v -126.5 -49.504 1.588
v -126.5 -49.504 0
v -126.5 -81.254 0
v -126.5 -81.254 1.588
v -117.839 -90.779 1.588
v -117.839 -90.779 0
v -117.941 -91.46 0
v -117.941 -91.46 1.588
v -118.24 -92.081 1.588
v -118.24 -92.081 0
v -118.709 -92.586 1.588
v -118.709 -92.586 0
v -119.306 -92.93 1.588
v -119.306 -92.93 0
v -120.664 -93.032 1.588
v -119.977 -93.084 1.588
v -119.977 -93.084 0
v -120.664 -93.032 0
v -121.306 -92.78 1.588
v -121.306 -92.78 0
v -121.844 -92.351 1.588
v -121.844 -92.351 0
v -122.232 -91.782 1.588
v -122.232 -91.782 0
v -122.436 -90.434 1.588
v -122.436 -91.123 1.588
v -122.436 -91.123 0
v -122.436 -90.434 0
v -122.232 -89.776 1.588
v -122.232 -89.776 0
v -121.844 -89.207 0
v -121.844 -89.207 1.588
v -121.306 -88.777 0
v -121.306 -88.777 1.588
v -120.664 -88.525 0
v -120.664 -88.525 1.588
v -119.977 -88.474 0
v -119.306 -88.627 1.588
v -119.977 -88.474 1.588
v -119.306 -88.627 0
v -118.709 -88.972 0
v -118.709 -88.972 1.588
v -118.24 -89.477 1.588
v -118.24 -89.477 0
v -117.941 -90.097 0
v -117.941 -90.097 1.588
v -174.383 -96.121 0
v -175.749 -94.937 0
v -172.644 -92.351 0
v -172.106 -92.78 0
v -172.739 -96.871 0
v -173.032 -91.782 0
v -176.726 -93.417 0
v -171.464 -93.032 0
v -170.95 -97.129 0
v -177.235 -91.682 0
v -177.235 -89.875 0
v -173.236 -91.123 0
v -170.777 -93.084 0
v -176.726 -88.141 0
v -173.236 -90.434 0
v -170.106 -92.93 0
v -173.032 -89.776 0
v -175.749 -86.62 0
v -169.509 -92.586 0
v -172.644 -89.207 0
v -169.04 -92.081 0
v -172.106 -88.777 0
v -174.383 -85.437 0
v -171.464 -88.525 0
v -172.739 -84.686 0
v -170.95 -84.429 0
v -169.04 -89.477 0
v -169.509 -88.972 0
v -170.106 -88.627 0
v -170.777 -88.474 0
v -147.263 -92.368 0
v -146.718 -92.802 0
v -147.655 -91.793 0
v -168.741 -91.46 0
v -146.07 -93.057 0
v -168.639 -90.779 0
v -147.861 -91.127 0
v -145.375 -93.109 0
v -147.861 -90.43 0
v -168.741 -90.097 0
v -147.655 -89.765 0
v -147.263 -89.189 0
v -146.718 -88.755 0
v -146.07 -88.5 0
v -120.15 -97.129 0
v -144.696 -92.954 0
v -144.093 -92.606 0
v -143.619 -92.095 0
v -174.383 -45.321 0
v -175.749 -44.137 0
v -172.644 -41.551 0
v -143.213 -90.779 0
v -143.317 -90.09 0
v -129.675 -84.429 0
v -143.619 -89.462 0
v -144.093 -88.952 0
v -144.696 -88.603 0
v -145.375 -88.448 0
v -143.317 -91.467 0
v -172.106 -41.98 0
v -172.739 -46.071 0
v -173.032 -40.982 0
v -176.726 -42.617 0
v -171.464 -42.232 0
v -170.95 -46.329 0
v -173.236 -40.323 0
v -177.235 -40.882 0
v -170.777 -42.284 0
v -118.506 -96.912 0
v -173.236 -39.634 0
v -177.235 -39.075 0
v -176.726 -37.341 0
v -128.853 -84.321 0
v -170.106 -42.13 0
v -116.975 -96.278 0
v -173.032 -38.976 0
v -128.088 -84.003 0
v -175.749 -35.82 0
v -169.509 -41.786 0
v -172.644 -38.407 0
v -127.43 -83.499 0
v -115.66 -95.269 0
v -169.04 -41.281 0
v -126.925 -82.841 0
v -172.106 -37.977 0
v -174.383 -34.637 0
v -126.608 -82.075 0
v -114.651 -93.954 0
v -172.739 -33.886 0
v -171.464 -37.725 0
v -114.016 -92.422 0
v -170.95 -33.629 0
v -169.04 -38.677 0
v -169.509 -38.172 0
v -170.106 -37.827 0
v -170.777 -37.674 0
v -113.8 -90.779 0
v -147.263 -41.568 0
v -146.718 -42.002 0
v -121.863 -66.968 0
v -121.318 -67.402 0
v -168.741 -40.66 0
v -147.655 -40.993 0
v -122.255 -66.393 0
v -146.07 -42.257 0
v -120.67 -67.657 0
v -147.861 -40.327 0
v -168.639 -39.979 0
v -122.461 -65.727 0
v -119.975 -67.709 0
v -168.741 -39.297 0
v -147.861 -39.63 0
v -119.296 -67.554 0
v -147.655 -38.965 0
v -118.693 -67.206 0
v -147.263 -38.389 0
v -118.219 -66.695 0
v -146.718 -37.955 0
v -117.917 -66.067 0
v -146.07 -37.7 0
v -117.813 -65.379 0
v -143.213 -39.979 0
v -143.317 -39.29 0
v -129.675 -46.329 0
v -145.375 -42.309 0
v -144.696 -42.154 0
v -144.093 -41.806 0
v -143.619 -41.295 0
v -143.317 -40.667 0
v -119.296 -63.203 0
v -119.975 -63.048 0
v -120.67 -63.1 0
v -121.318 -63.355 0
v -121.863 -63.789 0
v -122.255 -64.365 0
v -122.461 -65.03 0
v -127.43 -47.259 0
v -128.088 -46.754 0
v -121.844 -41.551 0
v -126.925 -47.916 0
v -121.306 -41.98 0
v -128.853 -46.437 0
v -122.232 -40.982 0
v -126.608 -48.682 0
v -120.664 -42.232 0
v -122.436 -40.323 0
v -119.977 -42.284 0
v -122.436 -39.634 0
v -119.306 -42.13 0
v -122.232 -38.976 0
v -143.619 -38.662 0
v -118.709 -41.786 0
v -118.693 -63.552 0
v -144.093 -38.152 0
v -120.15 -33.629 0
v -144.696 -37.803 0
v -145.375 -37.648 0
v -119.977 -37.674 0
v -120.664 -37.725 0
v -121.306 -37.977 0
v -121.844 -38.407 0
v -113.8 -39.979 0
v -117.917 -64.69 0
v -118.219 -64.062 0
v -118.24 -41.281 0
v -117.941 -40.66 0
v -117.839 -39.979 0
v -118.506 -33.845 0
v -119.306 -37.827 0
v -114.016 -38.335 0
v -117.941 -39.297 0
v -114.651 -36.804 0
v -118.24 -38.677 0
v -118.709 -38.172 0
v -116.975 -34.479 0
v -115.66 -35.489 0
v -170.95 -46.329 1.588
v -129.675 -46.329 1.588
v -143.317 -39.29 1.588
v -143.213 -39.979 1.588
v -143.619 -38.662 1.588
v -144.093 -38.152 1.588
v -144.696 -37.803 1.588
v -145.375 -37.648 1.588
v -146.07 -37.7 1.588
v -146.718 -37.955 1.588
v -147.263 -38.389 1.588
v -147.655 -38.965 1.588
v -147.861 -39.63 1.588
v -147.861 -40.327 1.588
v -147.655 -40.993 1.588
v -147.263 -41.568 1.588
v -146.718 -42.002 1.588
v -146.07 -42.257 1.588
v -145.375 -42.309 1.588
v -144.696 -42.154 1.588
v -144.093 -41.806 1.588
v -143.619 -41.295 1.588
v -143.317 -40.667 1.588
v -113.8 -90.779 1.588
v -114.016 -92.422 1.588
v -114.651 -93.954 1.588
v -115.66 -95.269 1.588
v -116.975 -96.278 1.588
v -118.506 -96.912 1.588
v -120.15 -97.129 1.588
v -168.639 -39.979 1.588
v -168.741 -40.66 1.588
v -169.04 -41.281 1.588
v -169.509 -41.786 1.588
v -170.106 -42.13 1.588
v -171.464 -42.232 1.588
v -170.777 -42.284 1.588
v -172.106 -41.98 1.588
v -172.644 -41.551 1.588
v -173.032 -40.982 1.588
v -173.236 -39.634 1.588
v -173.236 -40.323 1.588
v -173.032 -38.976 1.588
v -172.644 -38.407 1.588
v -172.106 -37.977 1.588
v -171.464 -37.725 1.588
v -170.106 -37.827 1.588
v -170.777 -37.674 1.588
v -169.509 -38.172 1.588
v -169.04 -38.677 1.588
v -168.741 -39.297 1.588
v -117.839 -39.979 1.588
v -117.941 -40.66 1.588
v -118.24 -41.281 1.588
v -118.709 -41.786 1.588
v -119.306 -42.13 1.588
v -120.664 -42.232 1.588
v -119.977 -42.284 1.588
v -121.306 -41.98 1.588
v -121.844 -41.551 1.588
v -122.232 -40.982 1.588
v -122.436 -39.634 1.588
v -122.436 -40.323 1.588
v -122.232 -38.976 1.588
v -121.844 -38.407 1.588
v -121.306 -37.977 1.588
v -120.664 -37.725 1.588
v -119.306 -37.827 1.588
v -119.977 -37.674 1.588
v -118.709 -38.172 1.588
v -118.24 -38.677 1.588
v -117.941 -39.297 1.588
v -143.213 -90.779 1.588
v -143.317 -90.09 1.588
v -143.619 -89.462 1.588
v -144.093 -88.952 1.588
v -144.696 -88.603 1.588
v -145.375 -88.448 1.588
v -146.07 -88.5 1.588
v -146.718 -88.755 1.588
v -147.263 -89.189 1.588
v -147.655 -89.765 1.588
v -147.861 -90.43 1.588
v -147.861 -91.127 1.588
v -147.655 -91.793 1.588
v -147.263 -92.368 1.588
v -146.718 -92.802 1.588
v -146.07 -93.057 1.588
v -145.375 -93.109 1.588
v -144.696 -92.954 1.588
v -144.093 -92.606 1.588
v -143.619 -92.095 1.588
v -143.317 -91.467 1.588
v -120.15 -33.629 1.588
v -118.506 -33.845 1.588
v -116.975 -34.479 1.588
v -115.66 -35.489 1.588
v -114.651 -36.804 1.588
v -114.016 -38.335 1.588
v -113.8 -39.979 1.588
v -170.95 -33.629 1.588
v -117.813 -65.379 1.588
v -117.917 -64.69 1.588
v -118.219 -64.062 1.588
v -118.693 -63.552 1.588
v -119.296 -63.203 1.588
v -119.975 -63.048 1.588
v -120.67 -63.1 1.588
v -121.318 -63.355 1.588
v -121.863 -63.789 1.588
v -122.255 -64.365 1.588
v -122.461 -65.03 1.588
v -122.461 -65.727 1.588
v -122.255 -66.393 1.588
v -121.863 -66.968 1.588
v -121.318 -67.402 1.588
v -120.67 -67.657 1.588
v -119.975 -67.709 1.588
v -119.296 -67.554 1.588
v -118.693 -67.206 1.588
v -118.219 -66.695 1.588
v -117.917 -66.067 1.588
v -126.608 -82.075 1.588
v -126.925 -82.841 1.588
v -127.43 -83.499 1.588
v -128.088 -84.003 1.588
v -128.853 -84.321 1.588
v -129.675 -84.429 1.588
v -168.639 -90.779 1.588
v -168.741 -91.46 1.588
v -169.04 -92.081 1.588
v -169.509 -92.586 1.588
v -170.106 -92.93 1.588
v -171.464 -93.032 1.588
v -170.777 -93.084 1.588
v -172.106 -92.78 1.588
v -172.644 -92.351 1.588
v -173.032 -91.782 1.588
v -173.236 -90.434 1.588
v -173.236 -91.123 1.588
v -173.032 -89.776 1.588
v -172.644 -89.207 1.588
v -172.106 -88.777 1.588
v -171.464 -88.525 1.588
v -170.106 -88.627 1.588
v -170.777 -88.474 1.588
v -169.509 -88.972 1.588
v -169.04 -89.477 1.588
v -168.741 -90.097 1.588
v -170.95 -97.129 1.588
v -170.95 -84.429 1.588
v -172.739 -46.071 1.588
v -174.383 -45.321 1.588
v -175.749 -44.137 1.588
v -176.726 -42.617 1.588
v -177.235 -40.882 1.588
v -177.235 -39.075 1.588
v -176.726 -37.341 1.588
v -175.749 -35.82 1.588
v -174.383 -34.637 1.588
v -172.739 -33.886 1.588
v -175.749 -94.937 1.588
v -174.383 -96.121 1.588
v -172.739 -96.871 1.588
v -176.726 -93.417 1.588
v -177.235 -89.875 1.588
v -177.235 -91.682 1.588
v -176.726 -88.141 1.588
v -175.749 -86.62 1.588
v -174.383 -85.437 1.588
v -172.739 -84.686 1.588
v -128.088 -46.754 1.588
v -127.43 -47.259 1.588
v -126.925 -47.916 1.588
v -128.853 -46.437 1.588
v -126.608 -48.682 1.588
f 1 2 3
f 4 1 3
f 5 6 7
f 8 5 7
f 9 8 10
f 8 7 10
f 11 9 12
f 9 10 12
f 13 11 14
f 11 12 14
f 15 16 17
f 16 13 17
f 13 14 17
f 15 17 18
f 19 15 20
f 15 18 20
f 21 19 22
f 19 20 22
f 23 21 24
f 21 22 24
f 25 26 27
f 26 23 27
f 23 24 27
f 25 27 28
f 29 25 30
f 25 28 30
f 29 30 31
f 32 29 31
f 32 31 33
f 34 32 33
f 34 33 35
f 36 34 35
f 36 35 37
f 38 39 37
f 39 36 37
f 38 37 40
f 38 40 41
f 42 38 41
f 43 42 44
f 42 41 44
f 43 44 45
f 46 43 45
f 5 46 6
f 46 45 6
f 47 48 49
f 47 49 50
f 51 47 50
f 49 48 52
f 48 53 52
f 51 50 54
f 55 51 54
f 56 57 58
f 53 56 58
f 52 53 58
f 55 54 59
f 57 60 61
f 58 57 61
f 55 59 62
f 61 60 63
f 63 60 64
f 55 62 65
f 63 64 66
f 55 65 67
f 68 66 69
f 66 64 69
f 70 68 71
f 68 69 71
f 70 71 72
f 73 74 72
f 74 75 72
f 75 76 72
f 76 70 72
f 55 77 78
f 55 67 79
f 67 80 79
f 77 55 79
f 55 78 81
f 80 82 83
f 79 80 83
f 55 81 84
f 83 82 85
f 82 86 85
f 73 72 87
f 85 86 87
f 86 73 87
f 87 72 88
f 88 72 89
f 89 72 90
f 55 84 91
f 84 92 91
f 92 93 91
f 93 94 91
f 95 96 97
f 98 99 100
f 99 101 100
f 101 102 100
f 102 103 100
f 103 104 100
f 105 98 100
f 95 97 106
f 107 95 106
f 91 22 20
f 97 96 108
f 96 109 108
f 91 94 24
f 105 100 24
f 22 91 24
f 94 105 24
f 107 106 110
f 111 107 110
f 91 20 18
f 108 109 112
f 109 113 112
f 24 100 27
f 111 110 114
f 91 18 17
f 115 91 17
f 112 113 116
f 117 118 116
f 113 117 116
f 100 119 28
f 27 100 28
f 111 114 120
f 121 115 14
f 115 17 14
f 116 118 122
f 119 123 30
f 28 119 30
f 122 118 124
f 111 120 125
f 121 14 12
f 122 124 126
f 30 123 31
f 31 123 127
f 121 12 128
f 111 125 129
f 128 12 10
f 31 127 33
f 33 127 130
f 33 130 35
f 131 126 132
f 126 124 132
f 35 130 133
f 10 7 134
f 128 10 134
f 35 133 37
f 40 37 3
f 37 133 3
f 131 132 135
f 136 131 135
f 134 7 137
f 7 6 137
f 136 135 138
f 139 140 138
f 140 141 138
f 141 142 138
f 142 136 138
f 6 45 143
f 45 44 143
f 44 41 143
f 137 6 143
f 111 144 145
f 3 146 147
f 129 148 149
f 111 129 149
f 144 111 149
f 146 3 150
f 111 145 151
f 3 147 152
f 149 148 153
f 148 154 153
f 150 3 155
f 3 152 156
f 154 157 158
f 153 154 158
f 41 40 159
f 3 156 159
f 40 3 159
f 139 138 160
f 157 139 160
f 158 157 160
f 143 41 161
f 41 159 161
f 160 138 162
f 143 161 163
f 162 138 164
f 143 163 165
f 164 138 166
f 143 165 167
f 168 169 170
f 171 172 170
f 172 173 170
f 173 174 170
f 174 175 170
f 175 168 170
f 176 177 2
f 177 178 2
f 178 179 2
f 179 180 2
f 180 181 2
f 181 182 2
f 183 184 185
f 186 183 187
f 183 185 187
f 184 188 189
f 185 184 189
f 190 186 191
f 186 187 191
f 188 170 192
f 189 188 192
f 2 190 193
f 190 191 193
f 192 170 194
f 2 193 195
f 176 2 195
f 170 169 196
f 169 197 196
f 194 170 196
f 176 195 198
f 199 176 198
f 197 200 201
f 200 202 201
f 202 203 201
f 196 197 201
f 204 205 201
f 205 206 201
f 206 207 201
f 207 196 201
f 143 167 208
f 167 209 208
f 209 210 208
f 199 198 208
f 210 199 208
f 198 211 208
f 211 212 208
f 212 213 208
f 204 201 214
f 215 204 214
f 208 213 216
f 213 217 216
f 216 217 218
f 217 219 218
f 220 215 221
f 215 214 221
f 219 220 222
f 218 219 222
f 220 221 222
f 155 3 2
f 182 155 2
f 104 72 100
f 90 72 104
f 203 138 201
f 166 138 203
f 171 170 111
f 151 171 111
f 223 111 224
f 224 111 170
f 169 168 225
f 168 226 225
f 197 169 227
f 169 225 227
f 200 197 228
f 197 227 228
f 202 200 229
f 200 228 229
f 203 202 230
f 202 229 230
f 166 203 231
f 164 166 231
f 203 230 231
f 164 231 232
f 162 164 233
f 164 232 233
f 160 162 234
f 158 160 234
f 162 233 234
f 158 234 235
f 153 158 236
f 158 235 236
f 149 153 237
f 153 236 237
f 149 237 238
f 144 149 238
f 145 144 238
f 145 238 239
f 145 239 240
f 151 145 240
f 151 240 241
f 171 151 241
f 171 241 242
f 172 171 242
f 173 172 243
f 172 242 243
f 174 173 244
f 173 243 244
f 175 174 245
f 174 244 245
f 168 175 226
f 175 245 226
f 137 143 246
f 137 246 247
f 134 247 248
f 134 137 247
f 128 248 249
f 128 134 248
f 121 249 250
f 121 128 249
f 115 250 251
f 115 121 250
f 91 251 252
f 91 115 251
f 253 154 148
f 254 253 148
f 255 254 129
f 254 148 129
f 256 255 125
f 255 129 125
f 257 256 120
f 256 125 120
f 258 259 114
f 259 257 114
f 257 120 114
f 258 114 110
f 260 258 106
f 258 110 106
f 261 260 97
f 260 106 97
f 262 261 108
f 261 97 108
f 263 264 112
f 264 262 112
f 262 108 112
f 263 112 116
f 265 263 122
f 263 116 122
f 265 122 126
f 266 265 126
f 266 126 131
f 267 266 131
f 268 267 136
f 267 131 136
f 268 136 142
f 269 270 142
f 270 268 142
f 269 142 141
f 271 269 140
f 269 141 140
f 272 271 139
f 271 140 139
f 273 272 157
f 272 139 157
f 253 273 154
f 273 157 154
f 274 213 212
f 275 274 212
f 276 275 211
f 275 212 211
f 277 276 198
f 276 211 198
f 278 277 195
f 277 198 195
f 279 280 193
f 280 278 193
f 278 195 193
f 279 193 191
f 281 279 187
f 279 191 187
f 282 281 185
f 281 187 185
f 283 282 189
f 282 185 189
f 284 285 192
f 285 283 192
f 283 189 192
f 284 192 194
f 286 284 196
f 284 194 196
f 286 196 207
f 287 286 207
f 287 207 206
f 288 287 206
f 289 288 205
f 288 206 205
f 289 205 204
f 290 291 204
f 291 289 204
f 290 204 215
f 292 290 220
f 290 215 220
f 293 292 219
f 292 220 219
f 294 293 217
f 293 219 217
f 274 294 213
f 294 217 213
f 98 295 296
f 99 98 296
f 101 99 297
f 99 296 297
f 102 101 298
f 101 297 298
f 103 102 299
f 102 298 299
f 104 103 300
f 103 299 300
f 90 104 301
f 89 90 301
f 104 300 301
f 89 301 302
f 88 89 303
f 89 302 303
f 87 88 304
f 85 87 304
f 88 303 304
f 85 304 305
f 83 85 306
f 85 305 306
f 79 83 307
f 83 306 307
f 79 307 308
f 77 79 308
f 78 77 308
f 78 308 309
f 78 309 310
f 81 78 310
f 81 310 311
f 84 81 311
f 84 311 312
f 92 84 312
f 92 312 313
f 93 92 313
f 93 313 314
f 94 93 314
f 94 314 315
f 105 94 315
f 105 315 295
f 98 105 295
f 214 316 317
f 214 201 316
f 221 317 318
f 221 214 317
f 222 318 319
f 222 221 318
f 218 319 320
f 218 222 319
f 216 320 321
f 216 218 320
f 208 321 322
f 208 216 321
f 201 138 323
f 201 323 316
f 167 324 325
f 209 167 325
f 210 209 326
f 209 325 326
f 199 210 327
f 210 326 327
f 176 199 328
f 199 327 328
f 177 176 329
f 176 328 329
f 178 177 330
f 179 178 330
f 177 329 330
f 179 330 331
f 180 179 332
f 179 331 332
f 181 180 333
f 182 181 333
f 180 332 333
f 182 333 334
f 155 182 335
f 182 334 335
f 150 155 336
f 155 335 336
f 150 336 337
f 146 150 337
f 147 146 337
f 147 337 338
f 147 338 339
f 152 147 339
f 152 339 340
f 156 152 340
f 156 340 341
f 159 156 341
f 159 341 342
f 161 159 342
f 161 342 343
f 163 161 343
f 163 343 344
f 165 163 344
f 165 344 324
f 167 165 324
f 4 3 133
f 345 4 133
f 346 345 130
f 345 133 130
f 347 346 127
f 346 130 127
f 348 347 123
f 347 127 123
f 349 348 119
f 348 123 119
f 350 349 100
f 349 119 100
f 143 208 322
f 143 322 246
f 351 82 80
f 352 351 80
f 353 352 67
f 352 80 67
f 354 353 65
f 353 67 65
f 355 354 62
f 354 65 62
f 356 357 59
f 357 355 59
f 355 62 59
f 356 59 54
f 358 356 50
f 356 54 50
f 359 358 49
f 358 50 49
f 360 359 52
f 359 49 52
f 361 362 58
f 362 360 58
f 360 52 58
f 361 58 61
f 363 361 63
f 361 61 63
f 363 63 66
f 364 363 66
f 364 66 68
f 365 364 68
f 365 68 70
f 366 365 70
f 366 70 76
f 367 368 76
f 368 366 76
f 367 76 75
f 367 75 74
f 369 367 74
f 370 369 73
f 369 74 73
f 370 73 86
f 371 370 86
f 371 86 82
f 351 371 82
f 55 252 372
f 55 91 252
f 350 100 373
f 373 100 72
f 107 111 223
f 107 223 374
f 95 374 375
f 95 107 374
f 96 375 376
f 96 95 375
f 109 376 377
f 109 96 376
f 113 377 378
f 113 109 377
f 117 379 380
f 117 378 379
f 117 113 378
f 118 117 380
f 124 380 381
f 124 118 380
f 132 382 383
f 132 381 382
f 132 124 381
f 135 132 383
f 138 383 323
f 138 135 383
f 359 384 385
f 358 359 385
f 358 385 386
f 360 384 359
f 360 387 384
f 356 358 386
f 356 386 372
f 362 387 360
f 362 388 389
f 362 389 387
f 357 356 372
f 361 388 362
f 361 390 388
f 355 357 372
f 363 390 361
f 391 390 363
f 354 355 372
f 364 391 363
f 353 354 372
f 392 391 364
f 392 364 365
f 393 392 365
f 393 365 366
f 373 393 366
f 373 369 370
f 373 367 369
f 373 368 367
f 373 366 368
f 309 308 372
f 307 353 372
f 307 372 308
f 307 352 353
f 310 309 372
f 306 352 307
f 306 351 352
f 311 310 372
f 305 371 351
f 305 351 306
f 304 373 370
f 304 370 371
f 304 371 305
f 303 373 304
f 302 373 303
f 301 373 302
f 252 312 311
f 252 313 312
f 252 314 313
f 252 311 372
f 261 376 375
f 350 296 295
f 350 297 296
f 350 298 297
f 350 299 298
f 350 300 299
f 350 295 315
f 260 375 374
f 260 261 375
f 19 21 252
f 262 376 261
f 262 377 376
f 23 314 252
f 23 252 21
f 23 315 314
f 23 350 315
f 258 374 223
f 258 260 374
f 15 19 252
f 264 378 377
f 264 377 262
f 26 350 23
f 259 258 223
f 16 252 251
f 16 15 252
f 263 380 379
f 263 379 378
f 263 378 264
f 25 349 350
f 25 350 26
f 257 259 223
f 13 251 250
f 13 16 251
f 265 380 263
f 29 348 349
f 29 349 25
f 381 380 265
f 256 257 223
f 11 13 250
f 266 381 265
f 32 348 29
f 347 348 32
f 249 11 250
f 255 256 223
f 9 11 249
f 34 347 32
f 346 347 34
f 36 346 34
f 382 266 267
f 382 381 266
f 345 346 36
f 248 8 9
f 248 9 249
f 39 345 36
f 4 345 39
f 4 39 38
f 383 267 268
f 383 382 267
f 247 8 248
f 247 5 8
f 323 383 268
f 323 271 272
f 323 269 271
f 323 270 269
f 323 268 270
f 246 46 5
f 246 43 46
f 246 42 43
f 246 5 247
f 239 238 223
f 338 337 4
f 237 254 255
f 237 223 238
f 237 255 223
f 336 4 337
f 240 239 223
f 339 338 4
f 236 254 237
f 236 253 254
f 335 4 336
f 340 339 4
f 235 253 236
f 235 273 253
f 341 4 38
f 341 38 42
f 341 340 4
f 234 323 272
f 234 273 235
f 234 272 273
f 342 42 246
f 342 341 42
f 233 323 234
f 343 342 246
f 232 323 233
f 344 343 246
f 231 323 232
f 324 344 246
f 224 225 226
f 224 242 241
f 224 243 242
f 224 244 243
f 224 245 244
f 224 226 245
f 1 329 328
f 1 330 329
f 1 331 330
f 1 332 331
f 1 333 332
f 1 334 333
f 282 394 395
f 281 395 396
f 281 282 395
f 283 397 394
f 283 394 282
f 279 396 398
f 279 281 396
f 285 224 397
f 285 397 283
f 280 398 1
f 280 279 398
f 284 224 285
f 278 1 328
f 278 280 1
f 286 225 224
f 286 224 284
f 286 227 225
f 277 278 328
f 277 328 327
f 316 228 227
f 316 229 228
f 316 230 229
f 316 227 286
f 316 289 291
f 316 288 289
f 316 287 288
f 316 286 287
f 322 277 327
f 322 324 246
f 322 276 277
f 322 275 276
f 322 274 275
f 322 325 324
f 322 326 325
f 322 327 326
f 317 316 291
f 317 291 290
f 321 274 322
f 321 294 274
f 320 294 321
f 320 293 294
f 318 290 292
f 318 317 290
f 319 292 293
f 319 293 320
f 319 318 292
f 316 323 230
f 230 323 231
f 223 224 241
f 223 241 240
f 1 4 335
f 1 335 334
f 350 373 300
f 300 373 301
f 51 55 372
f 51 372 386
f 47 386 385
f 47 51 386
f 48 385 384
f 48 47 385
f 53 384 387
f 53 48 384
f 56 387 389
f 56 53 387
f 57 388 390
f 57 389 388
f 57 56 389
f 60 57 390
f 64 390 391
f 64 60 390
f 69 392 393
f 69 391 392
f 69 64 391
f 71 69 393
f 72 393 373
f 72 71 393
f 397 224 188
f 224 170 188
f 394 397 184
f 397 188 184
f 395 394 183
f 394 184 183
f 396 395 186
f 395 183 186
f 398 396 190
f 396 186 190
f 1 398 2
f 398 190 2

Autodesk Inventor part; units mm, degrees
ref_plane "YZ Plane" through (0, 0, 0) normal (1, 0, 0) x (0, 1, 0)
ref_plane "XZ Plane" through (0, 0, 0) normal (0, 1, 0) x (-1, 0, 0)
ref_plane "XY Plane" through (0, 0, 0) normal (0, 0, 1) x (1, 0, 0)
sketch "Sketch1" plane through (0, 0, 0) normal (0, 0, 1) x (1, 0, 0)
  line L0 (-127.5242, -32.3587) -> (-188.9758, -32.3587) projected
  line L1 (-128.9881, -97.1287) -> (-187.5119, -97.1287) projected
  line L2 (-113.8, -97.1287) -> (-113.8, -85.5717) projected
  circle A0 centre (-120.15, -39.9787) radius 2.3114 projected
  circle A1 centre (-120.15, -90.7787) radius 2.3114 projected
  circle A2 centre (-170.95, -90.7787) radius 2.3114 projected
  circle A3 centre (-170.95, -39.9787) radius 2.3114 projected
  circle A4 centre (-158.25, -39.9787) radius 2.3114 projected
  circle A5 centre (-158.25, -90.7787) radius 2.3114 projected
  circle A6 centre (-120.15, -39.9787) radius 6.35
  circle A7 centre (-170.95, -39.9787) radius 6.35
  circle A8 centre (-170.95, -90.7787) radius 6.35
  circle A9 centre (-120.15, -90.7787) radius 6.35
  line L3 (-170.95, -33.6287) -> (-120.15, -33.6287)
  line L4 (-113.8, -39.9787) -> (-113.8, -90.7787)
  line L5 (-120.15, -97.1287) -> (-170.95, -97.1287)
  line L6 (-170.95, -46.3287) -> (-129.675, -46.3287)
  line L7 (-126.5, -49.5037) -> (-126.5, -81.2537)
  line L8 (-129.675, -84.4287) -> (-170.95, -84.4287)
  arc A10 (-126.5, -49.5037) -> (-129.675, -46.3287) centre (-129.675, -49.5037) ccw
  arc A11 (-129.675, -84.4287) -> (-126.5, -81.2537) centre (-129.675, -81.2537) ccw
  circle A12 centre (-170.95, -39.9787) radius 2.3114
  circle A13 centre (-120.15, -39.9787) radius 2.3114
  circle A14 centre (-120.15, -90.7787) radius 2.3114
  circle A15 centre (-170.95, -90.7787) radius 2.3114
  circle A16 centre (-158.25, -90.7787) radius 2.3114
  circle A17 centre (-158.25, -39.9787) radius 2.3114
  point P0 (0, 0)
  dimension "d6" = 12.7
  dimension "d7" = 12.7
  dimension "d8" = 12.7
  dimension "d9" = 12.7
  dimension "d10" = 3.175
extrude "Extrusion1" add sketch "Sketch1" along normal blind 1.5875
sketch "Sketch2" plane through (0, 0, 1.5875) normal (0, 0, 1) x (1, 0, 0)
  circle A0 centre (-158.25, -39.9787) radius 2.3114 projected
  circle A1 centre (-158.25, -39.9787) radius 2.3114
  circle A2 centre (-158.25, -90.7787) radius 2.3114 projected
  circle A3 centre (-158.25, -90.7787) radius 2.3114
  circle A4 centre (-145.55, -90.7787) radius 2.3368
  circle A5 centre (-170.95, -90.7787) radius 2.3114 projected
  circle A6 centre (-145.55, -39.9787) radius 2.3368
  circle A7 centre (-120.15, -65.3787) radius 2.3368
  circle A8 centre (-120.15, -39.9787) radius 2.3114 projected
  line L0 (-113.8, -90.7787) -> (-113.8, -39.9787) projected
  circle A9 centre (-170.95, -39.9787) radius 2.3114 projected
  circle A10 centre (-120.15, -90.7787) radius 2.3114 projected
  point P0 (0, 0)
  dimension "d13" = 4.6736
  dimension "d14" = 25.4
  dimension "d15" = 4.6736
  dimension "d16" = 4.6736
  dimension "d17" = 25.4
  dimension "d18" = 6.35
  dimension "d23" = 25.4
  dimension "d24" = 25.4
  dimension "d25" = 25.4
extrude "Extrusion2" cut sketch "Sketch2" against normal blind 25.4 contours A4 | A6 | A7
extrude "Extrusion3" add sketch "Sketch2" against normal up to surface (1.5875 mm away) contours A0 | A2
equation "\"BendRadius\" = Thickness"
equation "\"BendReliefWidth\" = Thickness"
equation "\"BendReliefDepth\" = 0.5 * Thickness"
equation "\"CornerReliefSize\" = 4 * Thickness"
equation "\"MinimumRemnant\" = 2 * Thickness"
equation "\"TransitionRadius\" = BendRadius"
equation "\"JacobiRadiusSize\" = BendRadius"
equation "\"GapSize\" = Thickness"
equation "\"Thickness\" = 1.5875"
properties part number "frontgusset" material "Polycarbonate, Clear"
